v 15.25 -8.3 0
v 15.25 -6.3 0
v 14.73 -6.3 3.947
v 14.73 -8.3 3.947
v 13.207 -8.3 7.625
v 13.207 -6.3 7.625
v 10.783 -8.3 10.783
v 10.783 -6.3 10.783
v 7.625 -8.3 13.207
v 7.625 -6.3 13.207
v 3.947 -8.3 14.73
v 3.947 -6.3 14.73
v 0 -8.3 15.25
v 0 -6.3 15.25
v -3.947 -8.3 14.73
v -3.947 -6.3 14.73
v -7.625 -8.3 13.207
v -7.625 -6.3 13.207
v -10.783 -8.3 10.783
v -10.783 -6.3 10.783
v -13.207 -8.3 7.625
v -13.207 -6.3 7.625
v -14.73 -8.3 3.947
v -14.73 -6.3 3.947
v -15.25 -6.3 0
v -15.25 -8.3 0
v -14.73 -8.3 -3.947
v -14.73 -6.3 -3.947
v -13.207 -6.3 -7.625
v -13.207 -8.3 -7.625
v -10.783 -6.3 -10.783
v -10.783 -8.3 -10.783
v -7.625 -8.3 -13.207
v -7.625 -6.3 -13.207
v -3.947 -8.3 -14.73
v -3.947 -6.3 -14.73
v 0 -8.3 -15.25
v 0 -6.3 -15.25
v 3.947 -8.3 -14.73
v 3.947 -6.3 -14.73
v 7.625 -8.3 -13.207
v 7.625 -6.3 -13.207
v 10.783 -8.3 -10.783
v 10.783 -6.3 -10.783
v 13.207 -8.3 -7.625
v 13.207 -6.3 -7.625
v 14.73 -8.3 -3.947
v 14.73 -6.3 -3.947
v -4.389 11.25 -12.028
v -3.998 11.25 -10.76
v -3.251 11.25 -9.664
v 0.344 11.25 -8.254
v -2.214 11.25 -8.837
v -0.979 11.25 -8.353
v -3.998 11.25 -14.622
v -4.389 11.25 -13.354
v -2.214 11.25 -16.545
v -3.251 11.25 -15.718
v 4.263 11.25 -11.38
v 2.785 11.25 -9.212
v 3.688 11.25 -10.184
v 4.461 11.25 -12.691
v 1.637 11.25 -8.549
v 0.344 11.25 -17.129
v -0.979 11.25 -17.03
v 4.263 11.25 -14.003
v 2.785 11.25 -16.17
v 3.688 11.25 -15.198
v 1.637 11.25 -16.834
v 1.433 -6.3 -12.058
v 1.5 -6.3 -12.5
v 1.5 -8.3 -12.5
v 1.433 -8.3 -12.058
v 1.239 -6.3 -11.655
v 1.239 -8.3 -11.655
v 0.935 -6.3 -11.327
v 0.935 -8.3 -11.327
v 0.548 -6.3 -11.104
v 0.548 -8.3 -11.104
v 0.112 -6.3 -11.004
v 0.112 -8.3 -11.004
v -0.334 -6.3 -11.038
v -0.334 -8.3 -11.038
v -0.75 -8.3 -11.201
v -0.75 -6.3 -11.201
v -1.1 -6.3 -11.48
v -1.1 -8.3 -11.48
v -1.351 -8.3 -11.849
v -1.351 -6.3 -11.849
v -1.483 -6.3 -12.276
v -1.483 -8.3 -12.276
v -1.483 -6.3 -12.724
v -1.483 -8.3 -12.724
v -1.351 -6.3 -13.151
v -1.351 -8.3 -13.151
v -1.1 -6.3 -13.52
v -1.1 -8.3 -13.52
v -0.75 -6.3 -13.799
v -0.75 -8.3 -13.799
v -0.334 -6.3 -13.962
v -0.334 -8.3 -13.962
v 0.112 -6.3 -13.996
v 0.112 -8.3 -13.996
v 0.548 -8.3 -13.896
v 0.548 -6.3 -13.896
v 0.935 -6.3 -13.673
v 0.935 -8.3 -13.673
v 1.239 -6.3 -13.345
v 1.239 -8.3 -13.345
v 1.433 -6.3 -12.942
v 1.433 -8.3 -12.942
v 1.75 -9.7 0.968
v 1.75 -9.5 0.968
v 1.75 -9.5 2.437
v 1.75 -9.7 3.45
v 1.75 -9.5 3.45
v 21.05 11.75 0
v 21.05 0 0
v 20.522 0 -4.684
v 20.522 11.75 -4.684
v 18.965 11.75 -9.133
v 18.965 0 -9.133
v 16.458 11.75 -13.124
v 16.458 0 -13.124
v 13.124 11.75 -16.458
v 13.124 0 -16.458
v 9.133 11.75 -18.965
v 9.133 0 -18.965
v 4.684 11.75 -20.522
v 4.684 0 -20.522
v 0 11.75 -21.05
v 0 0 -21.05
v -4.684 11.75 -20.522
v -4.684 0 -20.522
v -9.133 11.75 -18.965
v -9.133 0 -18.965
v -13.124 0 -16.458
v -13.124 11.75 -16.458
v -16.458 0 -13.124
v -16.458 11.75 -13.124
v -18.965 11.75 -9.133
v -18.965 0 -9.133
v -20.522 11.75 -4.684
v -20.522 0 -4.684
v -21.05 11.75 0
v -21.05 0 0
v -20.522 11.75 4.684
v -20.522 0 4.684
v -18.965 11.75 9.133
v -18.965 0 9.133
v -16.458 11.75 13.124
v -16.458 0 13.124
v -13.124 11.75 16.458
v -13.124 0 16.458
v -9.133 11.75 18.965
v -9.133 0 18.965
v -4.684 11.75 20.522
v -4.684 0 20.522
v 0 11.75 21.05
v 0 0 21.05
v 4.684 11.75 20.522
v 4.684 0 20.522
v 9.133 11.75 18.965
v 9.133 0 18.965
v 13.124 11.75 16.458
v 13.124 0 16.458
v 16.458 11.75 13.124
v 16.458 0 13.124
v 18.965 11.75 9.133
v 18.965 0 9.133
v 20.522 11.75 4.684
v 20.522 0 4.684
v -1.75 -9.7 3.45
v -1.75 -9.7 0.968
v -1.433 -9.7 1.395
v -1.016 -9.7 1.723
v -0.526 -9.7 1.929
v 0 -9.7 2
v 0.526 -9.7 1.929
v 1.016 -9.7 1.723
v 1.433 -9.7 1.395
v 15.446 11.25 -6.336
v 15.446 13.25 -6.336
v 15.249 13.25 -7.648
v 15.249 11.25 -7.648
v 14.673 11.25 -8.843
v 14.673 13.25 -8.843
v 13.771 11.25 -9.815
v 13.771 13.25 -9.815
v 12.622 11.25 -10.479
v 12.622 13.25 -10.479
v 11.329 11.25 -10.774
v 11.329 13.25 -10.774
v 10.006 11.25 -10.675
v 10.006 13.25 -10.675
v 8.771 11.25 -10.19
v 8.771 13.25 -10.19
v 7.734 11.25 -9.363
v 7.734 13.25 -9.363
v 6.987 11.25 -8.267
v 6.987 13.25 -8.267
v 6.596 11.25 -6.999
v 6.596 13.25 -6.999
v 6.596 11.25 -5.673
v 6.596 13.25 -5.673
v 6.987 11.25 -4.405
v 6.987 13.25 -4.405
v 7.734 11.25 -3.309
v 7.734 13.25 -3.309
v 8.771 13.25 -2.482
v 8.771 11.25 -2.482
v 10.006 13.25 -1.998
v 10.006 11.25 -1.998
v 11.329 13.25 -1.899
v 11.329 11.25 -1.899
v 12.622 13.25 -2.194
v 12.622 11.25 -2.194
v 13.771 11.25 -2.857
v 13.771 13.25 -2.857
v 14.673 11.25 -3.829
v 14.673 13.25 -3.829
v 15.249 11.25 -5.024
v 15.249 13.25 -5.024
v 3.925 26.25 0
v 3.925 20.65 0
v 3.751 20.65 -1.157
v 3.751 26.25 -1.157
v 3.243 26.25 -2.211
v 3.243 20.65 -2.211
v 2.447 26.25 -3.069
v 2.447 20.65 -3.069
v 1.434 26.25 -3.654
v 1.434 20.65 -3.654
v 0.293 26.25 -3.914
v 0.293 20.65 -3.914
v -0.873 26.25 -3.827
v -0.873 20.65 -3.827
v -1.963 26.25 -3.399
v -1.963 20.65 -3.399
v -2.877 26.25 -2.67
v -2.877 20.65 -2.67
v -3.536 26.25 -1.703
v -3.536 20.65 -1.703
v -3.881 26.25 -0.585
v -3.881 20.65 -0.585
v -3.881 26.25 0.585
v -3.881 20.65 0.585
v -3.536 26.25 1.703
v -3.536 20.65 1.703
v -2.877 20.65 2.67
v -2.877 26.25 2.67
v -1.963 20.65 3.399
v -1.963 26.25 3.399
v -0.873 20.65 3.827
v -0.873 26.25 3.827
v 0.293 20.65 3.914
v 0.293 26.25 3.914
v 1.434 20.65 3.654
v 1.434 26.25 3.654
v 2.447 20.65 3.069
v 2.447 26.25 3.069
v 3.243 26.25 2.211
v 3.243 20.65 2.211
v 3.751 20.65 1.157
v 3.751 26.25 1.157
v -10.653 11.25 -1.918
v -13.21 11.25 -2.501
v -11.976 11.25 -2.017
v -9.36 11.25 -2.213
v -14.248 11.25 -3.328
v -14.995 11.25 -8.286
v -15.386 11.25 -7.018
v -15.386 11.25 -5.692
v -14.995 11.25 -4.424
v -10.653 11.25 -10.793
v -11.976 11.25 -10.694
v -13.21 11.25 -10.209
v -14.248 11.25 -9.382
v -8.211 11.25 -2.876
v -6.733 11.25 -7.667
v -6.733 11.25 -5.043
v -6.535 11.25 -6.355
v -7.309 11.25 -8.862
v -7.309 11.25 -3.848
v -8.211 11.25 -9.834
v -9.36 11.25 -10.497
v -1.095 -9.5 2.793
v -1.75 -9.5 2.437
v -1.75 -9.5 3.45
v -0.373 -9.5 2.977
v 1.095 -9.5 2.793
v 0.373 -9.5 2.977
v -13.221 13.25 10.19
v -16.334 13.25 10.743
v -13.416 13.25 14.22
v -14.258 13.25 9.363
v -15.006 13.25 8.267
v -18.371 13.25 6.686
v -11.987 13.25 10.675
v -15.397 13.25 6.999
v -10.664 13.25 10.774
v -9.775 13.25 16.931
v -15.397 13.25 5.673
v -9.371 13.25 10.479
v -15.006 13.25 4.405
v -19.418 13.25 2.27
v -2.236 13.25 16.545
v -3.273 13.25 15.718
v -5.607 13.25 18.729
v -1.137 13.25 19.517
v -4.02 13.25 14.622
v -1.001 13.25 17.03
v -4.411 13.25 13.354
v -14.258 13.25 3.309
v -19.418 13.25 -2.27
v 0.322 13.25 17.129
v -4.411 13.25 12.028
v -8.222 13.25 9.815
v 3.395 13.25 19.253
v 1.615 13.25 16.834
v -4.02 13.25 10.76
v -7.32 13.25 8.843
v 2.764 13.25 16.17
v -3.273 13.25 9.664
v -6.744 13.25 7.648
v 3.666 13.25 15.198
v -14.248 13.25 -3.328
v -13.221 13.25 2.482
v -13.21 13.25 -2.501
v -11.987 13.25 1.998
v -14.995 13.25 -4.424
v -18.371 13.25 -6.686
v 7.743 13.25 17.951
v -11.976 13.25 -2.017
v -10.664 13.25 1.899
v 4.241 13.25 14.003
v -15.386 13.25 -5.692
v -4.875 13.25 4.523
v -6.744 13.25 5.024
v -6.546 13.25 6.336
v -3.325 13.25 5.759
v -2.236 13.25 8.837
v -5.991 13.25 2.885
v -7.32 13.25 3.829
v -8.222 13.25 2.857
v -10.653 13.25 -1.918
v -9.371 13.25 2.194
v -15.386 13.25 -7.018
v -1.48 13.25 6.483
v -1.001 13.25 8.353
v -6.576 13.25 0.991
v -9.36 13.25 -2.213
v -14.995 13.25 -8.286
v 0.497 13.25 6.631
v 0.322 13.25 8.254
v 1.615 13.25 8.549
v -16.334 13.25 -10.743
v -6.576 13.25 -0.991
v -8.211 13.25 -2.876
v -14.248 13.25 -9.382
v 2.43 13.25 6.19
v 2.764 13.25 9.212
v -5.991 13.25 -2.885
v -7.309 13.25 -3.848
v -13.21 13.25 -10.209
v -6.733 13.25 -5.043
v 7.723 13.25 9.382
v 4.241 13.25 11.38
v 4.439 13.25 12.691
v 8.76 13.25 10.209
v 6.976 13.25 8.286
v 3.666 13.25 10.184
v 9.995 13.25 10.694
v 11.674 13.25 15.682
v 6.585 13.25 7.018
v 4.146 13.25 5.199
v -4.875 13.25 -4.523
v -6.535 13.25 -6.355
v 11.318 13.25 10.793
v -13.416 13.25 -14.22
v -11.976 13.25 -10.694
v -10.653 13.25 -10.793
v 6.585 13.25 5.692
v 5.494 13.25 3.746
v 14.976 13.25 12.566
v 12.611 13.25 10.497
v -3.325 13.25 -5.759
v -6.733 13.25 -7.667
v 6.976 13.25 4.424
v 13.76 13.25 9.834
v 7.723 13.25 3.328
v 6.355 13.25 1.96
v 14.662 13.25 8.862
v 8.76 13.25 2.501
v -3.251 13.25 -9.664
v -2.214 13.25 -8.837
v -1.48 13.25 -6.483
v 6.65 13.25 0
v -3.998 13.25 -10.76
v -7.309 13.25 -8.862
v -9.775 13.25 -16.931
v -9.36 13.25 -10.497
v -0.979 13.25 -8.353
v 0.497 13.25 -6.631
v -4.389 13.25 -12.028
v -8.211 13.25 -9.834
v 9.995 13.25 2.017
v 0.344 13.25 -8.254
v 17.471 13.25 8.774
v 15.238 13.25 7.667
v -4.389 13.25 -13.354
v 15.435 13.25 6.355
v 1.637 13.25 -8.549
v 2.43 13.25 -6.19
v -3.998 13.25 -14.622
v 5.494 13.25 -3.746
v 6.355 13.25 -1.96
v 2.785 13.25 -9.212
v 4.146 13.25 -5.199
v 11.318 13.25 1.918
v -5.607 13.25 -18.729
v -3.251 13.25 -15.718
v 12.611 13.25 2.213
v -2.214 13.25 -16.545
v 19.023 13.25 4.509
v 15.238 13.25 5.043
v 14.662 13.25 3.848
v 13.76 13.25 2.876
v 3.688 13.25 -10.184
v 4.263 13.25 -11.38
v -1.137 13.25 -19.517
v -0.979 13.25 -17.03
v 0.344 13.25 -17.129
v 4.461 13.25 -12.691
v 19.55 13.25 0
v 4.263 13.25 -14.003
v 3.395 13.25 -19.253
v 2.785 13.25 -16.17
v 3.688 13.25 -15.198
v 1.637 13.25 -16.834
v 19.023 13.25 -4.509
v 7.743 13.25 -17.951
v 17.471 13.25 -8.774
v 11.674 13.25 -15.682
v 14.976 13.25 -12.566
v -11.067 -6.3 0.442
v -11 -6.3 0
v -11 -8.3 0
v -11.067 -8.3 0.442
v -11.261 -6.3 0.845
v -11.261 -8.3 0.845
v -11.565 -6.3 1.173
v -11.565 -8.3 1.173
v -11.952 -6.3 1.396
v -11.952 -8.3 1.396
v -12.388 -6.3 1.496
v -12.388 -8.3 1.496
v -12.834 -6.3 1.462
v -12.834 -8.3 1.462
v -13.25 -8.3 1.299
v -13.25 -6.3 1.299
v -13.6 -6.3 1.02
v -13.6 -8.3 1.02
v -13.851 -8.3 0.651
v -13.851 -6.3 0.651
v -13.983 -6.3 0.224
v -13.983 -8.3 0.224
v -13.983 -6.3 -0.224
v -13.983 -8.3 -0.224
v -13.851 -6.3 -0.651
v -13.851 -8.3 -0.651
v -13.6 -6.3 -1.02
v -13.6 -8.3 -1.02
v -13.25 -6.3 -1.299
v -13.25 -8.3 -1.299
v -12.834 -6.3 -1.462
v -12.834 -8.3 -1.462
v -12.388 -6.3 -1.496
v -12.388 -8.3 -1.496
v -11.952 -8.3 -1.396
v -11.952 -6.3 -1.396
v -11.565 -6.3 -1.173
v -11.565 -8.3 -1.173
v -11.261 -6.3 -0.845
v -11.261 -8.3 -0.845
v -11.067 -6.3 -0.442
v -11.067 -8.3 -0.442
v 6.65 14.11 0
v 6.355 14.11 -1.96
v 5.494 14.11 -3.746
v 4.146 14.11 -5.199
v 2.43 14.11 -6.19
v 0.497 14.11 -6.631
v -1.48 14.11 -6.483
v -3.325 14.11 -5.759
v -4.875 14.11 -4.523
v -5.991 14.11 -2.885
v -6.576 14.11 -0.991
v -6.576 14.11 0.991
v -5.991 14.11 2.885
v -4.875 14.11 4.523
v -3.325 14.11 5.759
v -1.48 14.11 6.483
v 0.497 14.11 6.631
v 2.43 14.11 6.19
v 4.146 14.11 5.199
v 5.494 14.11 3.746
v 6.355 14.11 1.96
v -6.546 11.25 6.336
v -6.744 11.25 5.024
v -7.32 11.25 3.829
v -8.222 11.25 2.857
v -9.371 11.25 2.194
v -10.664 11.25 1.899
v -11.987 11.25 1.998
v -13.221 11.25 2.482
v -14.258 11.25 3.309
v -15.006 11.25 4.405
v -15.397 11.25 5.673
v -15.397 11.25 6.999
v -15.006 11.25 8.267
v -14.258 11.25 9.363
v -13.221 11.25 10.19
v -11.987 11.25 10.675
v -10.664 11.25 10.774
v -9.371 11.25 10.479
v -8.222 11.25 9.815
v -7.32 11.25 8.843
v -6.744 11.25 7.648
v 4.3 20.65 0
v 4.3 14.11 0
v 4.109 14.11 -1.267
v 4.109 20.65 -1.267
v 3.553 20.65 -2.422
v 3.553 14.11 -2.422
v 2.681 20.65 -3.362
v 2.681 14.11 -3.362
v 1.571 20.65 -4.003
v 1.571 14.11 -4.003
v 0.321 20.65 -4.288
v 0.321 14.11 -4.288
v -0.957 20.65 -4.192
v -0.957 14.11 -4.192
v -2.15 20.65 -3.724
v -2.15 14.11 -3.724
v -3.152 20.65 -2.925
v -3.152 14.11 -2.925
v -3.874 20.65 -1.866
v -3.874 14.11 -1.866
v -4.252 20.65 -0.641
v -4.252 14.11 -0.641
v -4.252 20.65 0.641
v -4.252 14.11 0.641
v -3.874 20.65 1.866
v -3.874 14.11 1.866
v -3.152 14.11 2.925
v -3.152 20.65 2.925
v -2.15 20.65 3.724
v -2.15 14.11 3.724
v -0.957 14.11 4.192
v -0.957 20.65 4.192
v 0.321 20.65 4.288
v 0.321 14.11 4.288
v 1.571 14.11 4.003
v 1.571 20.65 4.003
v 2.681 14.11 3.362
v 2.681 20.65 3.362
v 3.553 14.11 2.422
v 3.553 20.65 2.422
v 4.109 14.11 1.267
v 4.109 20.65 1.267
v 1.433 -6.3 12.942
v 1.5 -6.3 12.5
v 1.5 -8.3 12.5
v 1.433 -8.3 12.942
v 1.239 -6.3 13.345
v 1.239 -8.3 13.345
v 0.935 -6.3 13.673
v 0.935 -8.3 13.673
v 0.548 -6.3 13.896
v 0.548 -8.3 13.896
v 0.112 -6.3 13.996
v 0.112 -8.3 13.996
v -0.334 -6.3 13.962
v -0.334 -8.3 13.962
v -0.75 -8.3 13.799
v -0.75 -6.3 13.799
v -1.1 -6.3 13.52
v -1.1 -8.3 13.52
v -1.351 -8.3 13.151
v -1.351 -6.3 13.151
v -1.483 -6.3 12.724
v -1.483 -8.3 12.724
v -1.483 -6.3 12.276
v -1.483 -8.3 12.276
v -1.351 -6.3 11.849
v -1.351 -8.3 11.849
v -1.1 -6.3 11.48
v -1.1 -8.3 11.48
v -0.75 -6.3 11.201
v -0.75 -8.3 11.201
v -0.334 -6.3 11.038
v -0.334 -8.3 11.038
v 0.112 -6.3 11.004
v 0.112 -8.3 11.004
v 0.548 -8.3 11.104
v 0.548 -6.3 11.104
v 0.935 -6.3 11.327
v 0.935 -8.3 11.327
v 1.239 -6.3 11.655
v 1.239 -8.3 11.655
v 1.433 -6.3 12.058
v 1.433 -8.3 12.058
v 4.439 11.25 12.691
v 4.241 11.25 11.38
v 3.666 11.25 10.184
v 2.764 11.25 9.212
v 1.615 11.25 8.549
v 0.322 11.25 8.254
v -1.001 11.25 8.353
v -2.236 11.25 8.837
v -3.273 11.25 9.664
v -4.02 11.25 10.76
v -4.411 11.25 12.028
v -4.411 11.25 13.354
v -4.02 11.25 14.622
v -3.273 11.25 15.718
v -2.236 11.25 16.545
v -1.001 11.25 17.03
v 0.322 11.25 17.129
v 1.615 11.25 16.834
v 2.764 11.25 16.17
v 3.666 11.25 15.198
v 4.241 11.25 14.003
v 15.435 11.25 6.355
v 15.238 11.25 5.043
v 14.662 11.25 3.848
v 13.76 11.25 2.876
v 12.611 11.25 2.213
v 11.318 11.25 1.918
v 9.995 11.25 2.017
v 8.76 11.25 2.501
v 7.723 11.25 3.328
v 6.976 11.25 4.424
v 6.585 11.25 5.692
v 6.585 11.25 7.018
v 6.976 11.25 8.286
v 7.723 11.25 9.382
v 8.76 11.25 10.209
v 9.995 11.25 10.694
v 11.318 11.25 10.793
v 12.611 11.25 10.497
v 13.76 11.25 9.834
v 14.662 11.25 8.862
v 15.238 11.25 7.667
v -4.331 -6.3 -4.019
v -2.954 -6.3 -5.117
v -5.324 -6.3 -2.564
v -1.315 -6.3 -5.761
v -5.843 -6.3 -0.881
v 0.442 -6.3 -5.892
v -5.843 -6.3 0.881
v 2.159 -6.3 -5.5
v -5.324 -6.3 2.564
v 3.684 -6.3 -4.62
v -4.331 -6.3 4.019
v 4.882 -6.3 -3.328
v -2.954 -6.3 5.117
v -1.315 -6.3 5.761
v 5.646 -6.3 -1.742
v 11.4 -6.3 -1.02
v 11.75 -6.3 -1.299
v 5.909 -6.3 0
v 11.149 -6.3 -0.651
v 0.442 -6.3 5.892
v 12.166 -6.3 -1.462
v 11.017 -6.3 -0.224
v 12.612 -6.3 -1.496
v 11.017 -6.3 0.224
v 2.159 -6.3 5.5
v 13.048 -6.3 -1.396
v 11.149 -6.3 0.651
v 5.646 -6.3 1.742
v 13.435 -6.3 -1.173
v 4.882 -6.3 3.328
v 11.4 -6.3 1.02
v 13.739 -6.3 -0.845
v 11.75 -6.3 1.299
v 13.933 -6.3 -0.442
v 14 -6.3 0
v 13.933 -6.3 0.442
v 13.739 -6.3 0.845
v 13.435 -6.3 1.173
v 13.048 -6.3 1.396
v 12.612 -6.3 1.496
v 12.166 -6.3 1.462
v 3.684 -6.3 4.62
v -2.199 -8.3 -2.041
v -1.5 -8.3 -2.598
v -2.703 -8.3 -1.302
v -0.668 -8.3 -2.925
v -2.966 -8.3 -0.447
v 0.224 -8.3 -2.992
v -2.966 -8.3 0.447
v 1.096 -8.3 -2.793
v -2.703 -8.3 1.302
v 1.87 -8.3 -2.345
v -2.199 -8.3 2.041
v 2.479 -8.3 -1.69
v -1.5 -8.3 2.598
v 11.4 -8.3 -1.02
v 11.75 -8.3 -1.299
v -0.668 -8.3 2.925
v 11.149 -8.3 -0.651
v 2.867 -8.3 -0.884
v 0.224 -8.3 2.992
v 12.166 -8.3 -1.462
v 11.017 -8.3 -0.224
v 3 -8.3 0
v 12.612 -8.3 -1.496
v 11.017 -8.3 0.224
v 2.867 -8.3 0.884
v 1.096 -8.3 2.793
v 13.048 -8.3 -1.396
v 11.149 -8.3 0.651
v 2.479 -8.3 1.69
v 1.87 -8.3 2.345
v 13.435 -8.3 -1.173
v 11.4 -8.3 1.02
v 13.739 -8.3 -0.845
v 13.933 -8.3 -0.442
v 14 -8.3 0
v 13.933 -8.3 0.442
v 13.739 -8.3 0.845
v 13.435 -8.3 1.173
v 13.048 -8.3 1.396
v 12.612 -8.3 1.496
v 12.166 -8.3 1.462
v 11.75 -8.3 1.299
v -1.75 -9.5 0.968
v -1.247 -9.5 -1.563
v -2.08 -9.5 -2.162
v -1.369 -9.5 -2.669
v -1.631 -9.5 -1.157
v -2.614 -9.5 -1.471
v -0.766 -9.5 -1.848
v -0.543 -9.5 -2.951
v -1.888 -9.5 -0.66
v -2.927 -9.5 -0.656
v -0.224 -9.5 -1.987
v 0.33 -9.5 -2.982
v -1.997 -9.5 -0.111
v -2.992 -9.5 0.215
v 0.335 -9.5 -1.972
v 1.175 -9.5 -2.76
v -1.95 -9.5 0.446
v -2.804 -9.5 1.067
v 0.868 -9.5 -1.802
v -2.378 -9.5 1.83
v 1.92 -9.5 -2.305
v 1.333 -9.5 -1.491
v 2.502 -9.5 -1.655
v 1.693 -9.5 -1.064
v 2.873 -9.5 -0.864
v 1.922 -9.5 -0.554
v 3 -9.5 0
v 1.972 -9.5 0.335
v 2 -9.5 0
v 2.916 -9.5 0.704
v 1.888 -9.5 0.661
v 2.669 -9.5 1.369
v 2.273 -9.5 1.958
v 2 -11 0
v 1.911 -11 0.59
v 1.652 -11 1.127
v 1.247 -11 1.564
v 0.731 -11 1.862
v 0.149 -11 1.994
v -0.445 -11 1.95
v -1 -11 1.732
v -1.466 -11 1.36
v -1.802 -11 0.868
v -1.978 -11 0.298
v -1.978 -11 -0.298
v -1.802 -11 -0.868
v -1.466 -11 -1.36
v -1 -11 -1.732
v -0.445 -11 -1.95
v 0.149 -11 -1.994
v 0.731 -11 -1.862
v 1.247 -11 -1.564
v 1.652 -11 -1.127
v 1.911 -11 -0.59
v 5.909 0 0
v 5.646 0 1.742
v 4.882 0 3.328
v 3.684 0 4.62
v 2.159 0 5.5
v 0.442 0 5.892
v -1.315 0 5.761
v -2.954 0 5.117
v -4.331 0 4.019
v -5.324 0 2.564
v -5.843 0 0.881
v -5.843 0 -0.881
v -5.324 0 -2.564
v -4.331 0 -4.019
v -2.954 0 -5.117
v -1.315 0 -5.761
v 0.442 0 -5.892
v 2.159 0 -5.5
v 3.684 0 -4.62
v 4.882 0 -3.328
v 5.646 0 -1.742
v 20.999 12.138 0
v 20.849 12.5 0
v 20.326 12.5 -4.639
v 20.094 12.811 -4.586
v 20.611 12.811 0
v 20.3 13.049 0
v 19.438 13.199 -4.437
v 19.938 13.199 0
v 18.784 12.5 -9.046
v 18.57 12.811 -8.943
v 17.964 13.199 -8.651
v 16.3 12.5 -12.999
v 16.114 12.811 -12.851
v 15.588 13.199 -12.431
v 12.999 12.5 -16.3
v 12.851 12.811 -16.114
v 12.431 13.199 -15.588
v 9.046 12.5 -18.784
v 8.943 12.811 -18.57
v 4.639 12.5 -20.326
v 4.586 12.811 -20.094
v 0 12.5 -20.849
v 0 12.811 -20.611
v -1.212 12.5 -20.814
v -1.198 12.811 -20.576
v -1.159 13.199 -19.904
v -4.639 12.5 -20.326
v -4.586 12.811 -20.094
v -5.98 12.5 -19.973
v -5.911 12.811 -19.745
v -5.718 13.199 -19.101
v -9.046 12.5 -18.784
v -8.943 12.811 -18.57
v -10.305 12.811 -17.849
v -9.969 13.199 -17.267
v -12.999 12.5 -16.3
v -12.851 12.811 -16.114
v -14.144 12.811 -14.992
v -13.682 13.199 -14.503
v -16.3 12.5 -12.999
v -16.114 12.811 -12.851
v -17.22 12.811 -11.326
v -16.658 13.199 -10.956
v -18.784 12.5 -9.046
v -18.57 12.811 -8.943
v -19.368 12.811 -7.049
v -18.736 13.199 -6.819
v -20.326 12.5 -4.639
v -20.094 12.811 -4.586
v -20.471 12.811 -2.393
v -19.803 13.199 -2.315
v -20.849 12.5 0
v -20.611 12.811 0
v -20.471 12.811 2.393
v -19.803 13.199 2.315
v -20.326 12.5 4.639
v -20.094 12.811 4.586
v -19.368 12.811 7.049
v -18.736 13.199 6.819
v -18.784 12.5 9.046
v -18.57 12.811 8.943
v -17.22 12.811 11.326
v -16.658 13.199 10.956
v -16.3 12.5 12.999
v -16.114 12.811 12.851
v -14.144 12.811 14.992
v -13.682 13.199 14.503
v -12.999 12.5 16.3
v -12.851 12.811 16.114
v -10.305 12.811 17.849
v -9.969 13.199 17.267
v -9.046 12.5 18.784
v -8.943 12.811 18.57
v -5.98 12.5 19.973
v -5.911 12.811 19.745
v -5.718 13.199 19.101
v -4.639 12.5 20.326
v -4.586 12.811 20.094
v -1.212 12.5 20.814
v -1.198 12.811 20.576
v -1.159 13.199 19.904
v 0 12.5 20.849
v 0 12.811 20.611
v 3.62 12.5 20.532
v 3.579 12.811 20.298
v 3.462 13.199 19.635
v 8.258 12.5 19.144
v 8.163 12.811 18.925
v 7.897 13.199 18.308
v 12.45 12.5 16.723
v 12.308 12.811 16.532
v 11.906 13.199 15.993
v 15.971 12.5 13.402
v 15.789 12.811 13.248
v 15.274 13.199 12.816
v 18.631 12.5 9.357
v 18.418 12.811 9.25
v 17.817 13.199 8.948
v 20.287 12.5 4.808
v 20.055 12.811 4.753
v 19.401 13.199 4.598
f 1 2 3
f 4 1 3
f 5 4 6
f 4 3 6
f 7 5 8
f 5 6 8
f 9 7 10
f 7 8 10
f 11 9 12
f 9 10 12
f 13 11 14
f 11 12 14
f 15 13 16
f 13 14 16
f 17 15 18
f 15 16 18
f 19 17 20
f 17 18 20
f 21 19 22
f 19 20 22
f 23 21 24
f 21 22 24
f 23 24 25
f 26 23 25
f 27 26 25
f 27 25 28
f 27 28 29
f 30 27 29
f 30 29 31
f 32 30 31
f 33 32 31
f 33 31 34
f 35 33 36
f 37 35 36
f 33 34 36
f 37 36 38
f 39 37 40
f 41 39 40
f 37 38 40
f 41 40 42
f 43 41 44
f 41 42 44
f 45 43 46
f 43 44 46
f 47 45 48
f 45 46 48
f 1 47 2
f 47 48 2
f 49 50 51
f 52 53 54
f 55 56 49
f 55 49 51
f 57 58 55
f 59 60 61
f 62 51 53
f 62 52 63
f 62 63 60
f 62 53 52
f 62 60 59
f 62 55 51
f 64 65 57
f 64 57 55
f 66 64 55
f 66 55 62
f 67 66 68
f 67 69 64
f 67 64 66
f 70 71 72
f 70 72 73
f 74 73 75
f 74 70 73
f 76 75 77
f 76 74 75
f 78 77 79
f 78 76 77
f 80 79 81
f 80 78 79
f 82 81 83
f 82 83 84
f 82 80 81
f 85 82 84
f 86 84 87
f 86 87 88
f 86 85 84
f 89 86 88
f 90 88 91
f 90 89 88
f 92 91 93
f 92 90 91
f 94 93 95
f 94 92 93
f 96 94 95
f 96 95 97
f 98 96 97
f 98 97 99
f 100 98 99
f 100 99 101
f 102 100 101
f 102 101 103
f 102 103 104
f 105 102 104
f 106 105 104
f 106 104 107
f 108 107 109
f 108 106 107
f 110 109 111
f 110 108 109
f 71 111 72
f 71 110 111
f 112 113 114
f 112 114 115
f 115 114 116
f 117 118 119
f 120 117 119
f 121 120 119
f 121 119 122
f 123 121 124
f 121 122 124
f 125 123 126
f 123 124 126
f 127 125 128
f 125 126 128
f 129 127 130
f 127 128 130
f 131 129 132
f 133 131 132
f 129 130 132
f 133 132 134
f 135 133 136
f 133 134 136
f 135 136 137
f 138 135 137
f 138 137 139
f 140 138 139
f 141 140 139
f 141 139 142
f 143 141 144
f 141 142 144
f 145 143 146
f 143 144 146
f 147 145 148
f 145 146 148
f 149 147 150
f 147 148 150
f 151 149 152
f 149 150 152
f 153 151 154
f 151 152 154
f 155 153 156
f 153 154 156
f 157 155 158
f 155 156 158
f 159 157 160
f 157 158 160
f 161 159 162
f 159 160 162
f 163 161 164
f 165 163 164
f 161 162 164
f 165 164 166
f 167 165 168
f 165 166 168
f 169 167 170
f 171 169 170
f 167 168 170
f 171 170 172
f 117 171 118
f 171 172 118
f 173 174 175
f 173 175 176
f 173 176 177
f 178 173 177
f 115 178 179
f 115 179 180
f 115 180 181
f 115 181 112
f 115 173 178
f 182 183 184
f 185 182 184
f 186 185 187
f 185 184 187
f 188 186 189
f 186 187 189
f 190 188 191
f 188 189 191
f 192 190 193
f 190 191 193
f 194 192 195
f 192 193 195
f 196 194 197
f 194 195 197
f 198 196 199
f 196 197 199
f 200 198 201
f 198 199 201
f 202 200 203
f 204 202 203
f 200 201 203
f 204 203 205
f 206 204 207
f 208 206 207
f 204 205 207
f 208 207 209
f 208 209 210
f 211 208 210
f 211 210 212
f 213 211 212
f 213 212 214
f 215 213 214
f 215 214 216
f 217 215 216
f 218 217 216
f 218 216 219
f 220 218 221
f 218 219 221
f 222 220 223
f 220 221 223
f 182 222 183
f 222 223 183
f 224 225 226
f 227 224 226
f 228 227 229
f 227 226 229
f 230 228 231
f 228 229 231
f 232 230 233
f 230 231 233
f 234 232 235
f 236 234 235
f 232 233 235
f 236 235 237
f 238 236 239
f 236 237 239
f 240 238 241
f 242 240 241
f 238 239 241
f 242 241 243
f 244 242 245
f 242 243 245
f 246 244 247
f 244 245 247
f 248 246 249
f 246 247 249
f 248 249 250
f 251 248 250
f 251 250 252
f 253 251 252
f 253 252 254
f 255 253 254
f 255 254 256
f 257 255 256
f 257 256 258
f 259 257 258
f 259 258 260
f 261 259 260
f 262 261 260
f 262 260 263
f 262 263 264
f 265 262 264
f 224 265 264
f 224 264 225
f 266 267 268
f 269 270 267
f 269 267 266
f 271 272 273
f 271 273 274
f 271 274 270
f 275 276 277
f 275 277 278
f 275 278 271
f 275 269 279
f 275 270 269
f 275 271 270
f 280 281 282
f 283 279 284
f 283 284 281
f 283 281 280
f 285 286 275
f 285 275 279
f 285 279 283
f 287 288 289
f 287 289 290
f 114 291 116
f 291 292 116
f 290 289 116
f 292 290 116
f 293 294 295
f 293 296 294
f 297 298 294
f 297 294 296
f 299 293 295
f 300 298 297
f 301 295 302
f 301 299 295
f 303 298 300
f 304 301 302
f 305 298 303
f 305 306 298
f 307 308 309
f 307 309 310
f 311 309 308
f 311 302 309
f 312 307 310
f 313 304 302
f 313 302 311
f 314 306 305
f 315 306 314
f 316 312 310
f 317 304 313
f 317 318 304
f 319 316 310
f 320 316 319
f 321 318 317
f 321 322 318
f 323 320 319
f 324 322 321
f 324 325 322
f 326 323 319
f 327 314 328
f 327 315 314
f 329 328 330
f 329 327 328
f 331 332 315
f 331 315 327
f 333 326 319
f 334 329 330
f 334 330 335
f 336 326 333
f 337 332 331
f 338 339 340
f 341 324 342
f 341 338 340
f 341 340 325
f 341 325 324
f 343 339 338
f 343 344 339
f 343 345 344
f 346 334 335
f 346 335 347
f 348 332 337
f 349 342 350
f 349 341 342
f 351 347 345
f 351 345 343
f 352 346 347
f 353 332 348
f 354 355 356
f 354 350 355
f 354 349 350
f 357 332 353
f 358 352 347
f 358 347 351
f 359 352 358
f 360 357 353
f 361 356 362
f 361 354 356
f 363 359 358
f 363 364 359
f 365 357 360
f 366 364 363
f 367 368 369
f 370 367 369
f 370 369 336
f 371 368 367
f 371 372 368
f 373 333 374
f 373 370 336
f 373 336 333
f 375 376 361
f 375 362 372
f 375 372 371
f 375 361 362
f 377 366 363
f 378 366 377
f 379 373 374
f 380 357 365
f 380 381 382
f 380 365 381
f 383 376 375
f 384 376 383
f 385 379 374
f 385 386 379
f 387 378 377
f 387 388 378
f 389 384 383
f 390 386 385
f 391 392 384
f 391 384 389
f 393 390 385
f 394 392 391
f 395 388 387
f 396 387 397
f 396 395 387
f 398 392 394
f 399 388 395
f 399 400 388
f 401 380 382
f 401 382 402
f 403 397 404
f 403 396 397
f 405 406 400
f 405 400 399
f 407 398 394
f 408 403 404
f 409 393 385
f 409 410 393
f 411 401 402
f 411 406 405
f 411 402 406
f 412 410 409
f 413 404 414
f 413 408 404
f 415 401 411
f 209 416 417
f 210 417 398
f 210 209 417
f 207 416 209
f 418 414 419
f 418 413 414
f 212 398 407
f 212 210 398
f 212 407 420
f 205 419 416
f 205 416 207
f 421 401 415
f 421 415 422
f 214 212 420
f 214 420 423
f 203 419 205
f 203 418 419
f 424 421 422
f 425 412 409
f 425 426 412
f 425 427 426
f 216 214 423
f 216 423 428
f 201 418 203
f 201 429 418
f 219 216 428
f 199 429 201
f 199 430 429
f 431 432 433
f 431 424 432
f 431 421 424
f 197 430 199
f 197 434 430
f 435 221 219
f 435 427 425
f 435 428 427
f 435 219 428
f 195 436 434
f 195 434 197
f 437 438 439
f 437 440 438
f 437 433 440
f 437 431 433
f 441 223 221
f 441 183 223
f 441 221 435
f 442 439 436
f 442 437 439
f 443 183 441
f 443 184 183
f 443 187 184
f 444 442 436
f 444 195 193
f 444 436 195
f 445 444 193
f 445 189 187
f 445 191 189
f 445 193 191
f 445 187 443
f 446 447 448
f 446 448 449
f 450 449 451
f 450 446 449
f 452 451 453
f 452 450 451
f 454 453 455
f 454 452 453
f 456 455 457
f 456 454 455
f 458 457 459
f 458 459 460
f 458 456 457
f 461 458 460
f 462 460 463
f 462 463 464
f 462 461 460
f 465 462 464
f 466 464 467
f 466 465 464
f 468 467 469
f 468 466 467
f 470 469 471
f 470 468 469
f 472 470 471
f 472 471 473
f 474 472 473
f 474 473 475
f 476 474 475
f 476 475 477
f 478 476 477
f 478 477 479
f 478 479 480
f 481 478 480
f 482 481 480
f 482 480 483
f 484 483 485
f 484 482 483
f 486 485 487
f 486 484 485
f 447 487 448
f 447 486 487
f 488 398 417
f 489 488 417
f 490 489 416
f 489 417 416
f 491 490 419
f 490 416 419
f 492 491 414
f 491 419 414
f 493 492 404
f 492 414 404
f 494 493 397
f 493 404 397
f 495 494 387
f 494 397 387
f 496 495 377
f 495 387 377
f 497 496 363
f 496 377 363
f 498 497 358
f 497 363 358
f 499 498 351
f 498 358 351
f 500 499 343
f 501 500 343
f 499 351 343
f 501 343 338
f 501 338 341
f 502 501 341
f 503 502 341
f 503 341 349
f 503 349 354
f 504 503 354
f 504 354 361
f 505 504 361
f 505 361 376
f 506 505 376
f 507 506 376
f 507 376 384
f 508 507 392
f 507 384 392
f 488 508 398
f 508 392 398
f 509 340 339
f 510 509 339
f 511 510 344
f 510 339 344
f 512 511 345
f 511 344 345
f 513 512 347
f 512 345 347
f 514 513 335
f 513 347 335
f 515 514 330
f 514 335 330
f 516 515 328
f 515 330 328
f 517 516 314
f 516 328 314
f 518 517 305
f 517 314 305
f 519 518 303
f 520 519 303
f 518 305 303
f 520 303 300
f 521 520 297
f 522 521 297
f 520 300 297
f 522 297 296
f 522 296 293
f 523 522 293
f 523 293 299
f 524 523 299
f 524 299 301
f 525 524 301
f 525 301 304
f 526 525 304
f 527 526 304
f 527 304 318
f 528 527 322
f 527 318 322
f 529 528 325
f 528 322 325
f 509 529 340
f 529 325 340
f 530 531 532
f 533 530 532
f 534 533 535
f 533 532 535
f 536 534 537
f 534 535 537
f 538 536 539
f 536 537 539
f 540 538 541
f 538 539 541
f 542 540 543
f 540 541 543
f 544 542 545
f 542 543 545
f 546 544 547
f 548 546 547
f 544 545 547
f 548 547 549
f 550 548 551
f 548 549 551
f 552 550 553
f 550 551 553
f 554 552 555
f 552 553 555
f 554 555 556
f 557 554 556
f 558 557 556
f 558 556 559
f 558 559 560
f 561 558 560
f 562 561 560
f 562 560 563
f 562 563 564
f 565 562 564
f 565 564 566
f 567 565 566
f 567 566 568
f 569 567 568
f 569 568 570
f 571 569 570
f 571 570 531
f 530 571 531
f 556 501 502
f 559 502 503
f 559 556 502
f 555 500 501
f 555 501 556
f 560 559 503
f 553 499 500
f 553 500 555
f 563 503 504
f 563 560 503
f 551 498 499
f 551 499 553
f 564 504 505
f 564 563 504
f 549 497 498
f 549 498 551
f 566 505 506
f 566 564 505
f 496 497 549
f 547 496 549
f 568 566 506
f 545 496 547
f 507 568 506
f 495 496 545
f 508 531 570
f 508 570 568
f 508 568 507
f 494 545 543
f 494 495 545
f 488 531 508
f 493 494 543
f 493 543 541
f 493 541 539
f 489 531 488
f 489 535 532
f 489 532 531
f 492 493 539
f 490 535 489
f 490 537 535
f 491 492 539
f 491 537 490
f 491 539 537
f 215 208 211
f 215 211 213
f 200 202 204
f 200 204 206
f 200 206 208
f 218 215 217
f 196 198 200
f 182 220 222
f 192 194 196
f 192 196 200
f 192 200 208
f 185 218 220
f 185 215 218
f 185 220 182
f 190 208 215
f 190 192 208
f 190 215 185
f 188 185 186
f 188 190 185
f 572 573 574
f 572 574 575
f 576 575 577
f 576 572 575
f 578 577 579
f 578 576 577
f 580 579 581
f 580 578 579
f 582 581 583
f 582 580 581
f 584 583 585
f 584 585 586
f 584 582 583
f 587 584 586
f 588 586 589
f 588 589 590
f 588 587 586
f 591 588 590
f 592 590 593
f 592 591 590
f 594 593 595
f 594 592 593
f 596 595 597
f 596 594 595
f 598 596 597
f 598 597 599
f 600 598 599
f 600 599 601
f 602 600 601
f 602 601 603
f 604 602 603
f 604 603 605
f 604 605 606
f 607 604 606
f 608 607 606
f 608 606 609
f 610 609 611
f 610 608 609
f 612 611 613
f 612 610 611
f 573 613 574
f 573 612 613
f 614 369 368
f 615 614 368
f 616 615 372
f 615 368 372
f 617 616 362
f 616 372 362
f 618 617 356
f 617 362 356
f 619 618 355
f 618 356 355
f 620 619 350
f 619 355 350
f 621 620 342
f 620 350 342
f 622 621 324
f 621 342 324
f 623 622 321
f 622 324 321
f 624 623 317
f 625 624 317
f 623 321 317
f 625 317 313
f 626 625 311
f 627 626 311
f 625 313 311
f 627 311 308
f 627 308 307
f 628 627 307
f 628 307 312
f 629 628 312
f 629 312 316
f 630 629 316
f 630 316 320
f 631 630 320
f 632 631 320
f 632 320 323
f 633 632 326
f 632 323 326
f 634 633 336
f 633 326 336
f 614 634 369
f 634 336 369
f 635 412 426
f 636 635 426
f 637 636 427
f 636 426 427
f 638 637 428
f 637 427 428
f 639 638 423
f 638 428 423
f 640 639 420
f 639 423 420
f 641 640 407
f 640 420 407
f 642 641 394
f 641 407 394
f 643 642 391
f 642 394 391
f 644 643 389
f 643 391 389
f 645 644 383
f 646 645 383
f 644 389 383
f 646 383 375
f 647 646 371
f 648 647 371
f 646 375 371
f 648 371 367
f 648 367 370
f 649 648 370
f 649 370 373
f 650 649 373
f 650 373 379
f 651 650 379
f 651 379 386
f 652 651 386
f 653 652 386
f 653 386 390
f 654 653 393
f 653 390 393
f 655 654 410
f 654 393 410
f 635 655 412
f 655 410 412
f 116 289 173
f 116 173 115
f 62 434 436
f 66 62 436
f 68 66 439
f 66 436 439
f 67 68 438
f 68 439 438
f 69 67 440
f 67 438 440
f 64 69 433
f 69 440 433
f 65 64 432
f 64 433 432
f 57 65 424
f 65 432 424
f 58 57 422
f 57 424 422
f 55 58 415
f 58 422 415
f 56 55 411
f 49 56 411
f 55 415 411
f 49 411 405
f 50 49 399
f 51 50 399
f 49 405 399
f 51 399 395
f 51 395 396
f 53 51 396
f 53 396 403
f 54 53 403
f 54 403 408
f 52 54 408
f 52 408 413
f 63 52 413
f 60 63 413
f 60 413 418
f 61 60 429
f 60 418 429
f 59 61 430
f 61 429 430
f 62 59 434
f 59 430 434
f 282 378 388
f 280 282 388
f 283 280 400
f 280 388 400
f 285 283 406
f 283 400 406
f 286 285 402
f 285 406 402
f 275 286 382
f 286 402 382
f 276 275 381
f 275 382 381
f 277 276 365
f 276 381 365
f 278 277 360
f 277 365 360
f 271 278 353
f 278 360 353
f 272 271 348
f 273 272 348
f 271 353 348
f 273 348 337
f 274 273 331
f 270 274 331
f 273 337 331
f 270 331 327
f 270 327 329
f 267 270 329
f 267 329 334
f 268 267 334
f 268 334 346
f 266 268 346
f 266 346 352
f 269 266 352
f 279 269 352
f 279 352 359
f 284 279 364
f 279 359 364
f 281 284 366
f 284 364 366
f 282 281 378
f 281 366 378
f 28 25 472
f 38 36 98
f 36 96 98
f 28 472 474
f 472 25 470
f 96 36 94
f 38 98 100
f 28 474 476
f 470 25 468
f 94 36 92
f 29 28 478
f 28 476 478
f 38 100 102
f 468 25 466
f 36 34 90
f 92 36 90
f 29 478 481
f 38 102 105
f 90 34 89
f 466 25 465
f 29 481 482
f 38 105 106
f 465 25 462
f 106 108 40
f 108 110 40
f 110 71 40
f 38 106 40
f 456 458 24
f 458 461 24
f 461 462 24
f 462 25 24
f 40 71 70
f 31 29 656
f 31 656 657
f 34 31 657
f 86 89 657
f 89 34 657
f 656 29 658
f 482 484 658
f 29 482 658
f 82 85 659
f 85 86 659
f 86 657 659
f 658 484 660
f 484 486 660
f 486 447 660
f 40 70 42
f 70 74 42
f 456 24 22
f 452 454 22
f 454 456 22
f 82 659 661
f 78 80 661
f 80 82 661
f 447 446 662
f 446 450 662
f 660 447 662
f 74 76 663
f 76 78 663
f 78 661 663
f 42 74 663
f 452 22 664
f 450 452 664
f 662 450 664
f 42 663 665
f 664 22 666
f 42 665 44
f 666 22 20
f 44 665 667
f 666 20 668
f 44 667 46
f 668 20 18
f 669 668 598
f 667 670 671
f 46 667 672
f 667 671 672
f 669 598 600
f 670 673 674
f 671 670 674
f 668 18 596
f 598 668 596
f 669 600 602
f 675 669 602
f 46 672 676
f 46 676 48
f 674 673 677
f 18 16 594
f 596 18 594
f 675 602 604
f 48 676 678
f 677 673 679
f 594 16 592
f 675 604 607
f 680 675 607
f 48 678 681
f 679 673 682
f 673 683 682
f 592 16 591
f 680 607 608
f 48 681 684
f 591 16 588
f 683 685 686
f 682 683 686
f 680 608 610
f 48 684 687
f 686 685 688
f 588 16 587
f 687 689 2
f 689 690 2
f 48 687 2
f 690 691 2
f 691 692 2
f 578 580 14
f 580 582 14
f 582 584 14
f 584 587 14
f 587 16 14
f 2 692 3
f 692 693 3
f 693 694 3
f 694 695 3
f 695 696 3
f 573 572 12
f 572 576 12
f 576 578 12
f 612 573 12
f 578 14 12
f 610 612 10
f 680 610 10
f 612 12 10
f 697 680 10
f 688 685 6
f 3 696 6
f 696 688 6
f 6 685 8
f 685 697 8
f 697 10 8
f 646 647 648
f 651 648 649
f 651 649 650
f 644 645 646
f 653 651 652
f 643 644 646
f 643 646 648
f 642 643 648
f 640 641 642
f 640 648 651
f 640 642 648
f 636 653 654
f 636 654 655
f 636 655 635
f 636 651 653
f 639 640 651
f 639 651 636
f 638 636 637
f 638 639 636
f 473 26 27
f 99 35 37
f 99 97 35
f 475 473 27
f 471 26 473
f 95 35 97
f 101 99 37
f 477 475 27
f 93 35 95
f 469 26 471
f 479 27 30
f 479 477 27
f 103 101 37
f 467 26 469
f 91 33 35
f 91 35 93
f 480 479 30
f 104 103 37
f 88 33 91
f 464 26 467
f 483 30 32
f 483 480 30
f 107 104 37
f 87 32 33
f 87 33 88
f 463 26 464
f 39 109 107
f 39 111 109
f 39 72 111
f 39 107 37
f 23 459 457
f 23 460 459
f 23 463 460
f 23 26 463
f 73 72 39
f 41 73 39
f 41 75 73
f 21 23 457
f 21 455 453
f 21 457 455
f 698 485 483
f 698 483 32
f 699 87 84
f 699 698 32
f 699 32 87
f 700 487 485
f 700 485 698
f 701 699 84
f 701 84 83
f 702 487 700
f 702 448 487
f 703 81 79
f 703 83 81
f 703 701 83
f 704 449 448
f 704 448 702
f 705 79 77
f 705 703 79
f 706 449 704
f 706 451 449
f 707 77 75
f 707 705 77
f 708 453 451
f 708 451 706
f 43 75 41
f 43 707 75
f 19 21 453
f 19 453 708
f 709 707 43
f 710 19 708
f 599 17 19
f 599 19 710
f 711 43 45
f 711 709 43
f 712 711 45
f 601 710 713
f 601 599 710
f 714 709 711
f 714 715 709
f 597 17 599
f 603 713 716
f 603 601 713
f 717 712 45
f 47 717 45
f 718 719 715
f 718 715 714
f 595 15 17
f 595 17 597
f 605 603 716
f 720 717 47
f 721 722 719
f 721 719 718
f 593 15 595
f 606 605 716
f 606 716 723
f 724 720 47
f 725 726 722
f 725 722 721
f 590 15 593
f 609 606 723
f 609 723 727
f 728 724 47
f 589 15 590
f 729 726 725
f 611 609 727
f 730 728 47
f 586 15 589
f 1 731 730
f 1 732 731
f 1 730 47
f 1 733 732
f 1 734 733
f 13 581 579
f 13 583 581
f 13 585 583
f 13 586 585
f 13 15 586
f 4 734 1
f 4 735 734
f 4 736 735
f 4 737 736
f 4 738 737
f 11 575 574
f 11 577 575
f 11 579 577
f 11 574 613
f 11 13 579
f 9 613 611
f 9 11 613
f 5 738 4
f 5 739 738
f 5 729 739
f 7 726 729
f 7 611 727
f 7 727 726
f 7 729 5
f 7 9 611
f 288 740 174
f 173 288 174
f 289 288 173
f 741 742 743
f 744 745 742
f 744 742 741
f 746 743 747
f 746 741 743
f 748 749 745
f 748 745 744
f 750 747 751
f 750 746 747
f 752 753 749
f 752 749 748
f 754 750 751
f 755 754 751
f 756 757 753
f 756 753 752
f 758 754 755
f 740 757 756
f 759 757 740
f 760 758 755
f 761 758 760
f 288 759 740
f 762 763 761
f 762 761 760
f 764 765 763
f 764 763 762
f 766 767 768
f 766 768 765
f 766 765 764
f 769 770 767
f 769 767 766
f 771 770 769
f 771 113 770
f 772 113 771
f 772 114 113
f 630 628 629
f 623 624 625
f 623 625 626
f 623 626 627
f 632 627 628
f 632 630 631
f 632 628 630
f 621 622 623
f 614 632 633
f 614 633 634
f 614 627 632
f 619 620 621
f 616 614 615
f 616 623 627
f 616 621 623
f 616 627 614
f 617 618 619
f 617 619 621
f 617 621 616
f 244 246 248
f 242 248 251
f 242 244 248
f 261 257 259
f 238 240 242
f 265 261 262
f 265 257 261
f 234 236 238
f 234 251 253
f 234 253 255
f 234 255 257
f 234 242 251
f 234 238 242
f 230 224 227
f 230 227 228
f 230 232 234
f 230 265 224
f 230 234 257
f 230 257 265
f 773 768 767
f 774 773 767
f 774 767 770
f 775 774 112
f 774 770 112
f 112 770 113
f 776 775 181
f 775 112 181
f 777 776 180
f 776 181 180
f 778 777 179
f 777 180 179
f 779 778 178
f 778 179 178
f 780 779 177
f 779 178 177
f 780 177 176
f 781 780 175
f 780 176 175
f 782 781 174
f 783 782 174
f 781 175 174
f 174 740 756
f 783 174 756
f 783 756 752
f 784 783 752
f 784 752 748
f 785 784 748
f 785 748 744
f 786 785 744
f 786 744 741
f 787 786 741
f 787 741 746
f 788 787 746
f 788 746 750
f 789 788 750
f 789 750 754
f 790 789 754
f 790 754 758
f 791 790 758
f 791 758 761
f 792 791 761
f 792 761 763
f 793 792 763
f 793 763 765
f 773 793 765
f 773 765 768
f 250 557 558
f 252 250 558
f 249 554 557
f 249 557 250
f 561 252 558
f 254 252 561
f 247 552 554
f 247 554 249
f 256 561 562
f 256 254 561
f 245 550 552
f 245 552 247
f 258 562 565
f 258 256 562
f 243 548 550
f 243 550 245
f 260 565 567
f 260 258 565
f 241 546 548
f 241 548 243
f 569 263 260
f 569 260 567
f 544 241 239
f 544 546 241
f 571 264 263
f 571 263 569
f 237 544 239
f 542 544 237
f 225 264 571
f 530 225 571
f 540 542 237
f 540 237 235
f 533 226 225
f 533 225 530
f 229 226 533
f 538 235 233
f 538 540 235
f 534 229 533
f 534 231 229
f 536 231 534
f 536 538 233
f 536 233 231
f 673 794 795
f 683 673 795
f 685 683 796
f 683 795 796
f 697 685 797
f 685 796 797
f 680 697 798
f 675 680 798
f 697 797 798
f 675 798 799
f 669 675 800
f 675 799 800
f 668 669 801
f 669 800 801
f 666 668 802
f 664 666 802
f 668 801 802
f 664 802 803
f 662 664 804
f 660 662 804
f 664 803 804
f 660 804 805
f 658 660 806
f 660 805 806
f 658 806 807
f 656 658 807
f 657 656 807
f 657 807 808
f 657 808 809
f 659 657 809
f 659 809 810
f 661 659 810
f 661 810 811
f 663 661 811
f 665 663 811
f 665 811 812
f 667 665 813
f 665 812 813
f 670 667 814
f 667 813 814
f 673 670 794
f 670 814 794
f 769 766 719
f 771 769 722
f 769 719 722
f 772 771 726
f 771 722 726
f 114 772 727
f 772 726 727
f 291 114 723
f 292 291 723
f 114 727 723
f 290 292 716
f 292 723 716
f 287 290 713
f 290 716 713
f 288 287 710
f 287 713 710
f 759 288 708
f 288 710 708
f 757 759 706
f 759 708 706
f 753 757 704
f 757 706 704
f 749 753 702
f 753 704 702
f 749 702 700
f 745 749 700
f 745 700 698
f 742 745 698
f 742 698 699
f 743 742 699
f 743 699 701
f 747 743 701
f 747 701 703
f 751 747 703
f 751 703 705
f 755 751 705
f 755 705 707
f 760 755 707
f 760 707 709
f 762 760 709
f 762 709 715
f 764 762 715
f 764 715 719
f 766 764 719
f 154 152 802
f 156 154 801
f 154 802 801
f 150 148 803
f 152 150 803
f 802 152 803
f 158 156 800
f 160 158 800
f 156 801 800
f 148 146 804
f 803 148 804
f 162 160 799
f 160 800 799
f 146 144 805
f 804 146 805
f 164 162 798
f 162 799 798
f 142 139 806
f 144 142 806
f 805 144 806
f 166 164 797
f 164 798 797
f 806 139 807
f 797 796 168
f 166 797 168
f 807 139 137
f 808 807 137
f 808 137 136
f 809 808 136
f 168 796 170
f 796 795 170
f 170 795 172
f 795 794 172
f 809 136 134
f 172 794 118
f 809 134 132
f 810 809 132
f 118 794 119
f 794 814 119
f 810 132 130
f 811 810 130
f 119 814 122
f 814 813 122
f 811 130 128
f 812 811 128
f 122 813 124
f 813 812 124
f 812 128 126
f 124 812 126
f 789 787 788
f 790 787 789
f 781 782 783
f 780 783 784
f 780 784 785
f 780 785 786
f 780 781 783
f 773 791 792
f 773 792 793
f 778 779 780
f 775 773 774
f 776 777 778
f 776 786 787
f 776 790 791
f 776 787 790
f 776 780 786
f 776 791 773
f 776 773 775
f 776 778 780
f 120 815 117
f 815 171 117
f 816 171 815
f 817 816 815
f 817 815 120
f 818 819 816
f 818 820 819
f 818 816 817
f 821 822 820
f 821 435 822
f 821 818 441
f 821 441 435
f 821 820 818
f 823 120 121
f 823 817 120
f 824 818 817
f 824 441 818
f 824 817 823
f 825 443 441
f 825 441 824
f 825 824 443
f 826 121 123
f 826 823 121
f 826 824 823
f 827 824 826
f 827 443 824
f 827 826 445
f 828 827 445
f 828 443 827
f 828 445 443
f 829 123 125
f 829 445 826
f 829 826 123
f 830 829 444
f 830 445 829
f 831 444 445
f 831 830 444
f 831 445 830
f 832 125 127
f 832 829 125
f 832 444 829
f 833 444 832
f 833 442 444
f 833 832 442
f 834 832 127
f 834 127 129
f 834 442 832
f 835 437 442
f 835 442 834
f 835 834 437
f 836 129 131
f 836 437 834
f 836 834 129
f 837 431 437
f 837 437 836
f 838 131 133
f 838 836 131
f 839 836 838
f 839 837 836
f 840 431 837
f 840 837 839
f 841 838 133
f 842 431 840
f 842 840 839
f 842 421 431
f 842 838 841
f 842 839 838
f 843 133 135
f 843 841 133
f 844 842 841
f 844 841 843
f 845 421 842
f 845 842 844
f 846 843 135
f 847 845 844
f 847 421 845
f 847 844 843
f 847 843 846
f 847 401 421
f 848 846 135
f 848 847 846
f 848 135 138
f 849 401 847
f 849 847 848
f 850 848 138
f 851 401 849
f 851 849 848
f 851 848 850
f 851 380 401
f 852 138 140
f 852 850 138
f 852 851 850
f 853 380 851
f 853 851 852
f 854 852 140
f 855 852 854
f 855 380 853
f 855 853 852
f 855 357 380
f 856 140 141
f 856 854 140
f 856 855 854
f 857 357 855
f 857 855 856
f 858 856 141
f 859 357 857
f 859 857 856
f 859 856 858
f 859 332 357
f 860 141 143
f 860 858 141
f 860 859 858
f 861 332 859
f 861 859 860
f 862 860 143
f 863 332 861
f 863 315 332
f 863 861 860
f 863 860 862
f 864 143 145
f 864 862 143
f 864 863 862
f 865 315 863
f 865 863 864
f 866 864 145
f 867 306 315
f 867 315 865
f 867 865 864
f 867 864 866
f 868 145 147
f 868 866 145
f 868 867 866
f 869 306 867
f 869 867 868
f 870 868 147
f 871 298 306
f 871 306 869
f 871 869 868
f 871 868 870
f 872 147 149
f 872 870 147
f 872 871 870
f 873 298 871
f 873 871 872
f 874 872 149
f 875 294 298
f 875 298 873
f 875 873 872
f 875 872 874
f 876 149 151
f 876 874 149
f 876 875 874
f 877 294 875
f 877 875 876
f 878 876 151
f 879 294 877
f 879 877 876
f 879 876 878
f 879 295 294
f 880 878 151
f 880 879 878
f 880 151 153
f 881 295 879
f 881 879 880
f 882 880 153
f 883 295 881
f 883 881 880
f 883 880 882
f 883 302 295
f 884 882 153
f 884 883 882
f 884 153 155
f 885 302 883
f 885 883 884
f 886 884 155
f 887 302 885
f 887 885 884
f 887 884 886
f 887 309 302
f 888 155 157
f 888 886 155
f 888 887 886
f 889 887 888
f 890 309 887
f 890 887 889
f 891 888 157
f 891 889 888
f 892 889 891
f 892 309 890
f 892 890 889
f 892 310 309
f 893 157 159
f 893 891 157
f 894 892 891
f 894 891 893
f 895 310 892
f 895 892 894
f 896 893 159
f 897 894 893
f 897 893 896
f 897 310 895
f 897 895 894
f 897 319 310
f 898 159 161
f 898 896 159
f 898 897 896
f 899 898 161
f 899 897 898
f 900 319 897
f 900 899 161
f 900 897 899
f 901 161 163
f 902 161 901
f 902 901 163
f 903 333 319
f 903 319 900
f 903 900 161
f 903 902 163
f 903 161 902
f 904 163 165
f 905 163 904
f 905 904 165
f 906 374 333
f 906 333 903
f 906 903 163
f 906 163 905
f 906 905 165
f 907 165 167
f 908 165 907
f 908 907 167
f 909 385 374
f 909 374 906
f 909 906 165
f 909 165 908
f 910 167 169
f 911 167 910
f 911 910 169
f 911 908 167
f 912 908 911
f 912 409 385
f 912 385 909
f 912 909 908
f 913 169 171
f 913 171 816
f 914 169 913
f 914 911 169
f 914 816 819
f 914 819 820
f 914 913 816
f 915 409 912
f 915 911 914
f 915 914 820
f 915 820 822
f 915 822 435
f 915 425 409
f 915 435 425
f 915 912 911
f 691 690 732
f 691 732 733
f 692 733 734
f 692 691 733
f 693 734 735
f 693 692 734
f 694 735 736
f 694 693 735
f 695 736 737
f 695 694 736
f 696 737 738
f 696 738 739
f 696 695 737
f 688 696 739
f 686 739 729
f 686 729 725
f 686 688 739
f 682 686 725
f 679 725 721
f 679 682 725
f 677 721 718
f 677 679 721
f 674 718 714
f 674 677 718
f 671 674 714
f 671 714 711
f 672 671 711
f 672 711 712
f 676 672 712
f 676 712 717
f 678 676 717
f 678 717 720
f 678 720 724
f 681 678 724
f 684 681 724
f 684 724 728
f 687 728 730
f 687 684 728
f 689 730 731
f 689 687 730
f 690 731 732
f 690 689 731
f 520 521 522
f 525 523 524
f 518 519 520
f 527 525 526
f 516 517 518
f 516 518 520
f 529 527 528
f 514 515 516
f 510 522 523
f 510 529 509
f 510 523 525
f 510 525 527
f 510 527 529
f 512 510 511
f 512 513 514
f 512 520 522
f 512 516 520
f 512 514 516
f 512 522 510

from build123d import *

# Parameters (mm, degrees)
CROQUIS1_R              = 21.05
SALIENTE_EXTRUIR1_DEPTH = 13.25
REDONDEO1_R             = 1.5
CROQUIS2_R              = 4.45
CORTAR_EXTRUIR1_DEPTH   = 2
CROQUIS3_R              = 3.925
SALIENTE_EXTRUIR2_DEPTH = 13
CROQUIS4_R              = 5.908652193
SALIENTE_EXTRUIR3_DEPTH = 6.3
CROQUIS5_R              = 15.25
CROQUIS5_R_2            = 1.5
SALIENTE_EXTRUIR4_DEPTH = 2
CROQUIS6_R              = 2
SALIENTE_EXTRUIR5_DEPTH = 2.7
CROQUIS7_R              = 3
SALIENTE_EXTRUIR6_DEPTH = 1.2
CROQUIS8_W              = 3.5
CROQUIS8_H              = 3.439508105
SALIENTE_EXTRUIR7_DEPTH = 0.2
CROQUIS9_R              = 4.3
SALIENTE_EXTRUIR8_DEPTH = 7.4
CROQUIS10_R             = 6.65
SALIENTE_EXTRUIR9_DEPTH = 0.86


with BuildPart() as part:
    # Croquis1 → Saliente-Extruir1 (new body)
    with BuildSketch(Plane(origin=(0, 0, 0), x_dir=(1, 0, 0), z_dir=(0, 1, 0))):
        Circle(CROQUIS1_R)
    extrude(amount=SALIENTE_EXTRUIR1_DEPTH)

    # Redondeo1
    redondeo1_edges = [part.edges().sort_by_distance(p)[0] for p in [
        (-21.05, 13.25, 0),
    ]]
    fillet(redondeo1_edges, radius=REDONDEO1_R)

    # Croquis2 → Cortar-Extruir1 (cut)
    with BuildSketch(Plane(origin=(0, 13.25, 0), x_dir=(1, 0, 0), z_dir=(0, 1, 0))):
        with Locations((0.010957244, 12.691225968)):
            Circle(CROQUIS2_R)
        with Locations((10.996402716, 6.336123732)):
            Circle(CROQUIS2_R)
        with Locations((10.985445471, -6.355102236)):
            Circle(CROQUIS2_R)
        with Locations((-0.010957244, -12.691225968)):
            Circle(CROQUIS2_R)
        with Locations((-10.996402716, -6.336123732)):
            Circle(CROQUIS2_R)
        with Locations((-10.985445471, 6.355102236)):
            Circle(CROQUIS2_R)
    extrude(amount=-CORTAR_EXTRUIR1_DEPTH, mode=Mode.SUBTRACT)

    # Croquis3 → Saliente-Extruir2 (add)
    with BuildSketch(Plane(origin=(0, 13.25, 0), x_dir=(1, 0, 0), z_dir=(0, 1, 0))):
        Circle(CROQUIS3_R)
    extrude(amount=SALIENTE_EXTRUIR2_DEPTH)

    # Croquis4 → Saliente-Extruir3 (add)
    with BuildSketch(Plane.XZ):
        Circle(CROQUIS4_R)
    extrude(amount=SALIENTE_EXTRUIR3_DEPTH)

    # Croquis5 → Saliente-Extruir4 (add)
    with BuildSketch(Plane.XZ.offset(6.3)):
        Circle(CROQUIS5_R)
        with Locations((0, 12.5)):
            Circle(CROQUIS5_R_2, mode=Mode.SUBTRACT)
        with Locations((12.5, 0)):
            Circle(CROQUIS5_R_2, mode=Mode.SUBTRACT)
        with Locations((0, -12.5)):
            Circle(CROQUIS5_R_2, mode=Mode.SUBTRACT)
        with Locations((-12.5, 0)):
            Circle(CROQUIS5_R_2, mode=Mode.SUBTRACT)
    extrude(amount=SALIENTE_EXTRUIR4_DEPTH)

    # Croquis6 → Saliente-Extruir5 (add)
    with BuildSketch(Plane.XZ.offset(8.3)):
        Circle(CROQUIS6_R)
    extrude(amount=SALIENTE_EXTRUIR5_DEPTH)

    # Croquis7 → Saliente-Extruir6 (add)
    with BuildSketch(Plane.XZ.offset(8.3)):
        Circle(CROQUIS7_R)
    extrude(amount=SALIENTE_EXTRUIR6_DEPTH)

    # Croquis8 → Saliente-Extruir7 (add)
    with BuildSketch(Plane.XZ.offset(9.5)):
        with Locations((0, 1.730245948)):
            Rectangle(CROQUIS8_W, CROQUIS8_H)
    extrude(amount=SALIENTE_EXTRUIR7_DEPTH)

    # Croquis9 → Saliente-Extruir8 (add)
    with BuildSketch(Plane(origin=(0, 13.25, 0), x_dir=(1, 0, 0), z_dir=(0, 1, 0))):
        Circle(CROQUIS9_R)
    extrude(amount=SALIENTE_EXTRUIR8_DEPTH)

    # Croquis10 → Saliente-Extruir9 (add)
    with BuildSketch(Plane(origin=(0, 13.25, 0), x_dir=(1, 0, 0), z_dir=(0, 1, 0))):
        Circle(CROQUIS10_R)
    extrude(amount=SALIENTE_EXTRUIR9_DEPTH)


solid = part.part
